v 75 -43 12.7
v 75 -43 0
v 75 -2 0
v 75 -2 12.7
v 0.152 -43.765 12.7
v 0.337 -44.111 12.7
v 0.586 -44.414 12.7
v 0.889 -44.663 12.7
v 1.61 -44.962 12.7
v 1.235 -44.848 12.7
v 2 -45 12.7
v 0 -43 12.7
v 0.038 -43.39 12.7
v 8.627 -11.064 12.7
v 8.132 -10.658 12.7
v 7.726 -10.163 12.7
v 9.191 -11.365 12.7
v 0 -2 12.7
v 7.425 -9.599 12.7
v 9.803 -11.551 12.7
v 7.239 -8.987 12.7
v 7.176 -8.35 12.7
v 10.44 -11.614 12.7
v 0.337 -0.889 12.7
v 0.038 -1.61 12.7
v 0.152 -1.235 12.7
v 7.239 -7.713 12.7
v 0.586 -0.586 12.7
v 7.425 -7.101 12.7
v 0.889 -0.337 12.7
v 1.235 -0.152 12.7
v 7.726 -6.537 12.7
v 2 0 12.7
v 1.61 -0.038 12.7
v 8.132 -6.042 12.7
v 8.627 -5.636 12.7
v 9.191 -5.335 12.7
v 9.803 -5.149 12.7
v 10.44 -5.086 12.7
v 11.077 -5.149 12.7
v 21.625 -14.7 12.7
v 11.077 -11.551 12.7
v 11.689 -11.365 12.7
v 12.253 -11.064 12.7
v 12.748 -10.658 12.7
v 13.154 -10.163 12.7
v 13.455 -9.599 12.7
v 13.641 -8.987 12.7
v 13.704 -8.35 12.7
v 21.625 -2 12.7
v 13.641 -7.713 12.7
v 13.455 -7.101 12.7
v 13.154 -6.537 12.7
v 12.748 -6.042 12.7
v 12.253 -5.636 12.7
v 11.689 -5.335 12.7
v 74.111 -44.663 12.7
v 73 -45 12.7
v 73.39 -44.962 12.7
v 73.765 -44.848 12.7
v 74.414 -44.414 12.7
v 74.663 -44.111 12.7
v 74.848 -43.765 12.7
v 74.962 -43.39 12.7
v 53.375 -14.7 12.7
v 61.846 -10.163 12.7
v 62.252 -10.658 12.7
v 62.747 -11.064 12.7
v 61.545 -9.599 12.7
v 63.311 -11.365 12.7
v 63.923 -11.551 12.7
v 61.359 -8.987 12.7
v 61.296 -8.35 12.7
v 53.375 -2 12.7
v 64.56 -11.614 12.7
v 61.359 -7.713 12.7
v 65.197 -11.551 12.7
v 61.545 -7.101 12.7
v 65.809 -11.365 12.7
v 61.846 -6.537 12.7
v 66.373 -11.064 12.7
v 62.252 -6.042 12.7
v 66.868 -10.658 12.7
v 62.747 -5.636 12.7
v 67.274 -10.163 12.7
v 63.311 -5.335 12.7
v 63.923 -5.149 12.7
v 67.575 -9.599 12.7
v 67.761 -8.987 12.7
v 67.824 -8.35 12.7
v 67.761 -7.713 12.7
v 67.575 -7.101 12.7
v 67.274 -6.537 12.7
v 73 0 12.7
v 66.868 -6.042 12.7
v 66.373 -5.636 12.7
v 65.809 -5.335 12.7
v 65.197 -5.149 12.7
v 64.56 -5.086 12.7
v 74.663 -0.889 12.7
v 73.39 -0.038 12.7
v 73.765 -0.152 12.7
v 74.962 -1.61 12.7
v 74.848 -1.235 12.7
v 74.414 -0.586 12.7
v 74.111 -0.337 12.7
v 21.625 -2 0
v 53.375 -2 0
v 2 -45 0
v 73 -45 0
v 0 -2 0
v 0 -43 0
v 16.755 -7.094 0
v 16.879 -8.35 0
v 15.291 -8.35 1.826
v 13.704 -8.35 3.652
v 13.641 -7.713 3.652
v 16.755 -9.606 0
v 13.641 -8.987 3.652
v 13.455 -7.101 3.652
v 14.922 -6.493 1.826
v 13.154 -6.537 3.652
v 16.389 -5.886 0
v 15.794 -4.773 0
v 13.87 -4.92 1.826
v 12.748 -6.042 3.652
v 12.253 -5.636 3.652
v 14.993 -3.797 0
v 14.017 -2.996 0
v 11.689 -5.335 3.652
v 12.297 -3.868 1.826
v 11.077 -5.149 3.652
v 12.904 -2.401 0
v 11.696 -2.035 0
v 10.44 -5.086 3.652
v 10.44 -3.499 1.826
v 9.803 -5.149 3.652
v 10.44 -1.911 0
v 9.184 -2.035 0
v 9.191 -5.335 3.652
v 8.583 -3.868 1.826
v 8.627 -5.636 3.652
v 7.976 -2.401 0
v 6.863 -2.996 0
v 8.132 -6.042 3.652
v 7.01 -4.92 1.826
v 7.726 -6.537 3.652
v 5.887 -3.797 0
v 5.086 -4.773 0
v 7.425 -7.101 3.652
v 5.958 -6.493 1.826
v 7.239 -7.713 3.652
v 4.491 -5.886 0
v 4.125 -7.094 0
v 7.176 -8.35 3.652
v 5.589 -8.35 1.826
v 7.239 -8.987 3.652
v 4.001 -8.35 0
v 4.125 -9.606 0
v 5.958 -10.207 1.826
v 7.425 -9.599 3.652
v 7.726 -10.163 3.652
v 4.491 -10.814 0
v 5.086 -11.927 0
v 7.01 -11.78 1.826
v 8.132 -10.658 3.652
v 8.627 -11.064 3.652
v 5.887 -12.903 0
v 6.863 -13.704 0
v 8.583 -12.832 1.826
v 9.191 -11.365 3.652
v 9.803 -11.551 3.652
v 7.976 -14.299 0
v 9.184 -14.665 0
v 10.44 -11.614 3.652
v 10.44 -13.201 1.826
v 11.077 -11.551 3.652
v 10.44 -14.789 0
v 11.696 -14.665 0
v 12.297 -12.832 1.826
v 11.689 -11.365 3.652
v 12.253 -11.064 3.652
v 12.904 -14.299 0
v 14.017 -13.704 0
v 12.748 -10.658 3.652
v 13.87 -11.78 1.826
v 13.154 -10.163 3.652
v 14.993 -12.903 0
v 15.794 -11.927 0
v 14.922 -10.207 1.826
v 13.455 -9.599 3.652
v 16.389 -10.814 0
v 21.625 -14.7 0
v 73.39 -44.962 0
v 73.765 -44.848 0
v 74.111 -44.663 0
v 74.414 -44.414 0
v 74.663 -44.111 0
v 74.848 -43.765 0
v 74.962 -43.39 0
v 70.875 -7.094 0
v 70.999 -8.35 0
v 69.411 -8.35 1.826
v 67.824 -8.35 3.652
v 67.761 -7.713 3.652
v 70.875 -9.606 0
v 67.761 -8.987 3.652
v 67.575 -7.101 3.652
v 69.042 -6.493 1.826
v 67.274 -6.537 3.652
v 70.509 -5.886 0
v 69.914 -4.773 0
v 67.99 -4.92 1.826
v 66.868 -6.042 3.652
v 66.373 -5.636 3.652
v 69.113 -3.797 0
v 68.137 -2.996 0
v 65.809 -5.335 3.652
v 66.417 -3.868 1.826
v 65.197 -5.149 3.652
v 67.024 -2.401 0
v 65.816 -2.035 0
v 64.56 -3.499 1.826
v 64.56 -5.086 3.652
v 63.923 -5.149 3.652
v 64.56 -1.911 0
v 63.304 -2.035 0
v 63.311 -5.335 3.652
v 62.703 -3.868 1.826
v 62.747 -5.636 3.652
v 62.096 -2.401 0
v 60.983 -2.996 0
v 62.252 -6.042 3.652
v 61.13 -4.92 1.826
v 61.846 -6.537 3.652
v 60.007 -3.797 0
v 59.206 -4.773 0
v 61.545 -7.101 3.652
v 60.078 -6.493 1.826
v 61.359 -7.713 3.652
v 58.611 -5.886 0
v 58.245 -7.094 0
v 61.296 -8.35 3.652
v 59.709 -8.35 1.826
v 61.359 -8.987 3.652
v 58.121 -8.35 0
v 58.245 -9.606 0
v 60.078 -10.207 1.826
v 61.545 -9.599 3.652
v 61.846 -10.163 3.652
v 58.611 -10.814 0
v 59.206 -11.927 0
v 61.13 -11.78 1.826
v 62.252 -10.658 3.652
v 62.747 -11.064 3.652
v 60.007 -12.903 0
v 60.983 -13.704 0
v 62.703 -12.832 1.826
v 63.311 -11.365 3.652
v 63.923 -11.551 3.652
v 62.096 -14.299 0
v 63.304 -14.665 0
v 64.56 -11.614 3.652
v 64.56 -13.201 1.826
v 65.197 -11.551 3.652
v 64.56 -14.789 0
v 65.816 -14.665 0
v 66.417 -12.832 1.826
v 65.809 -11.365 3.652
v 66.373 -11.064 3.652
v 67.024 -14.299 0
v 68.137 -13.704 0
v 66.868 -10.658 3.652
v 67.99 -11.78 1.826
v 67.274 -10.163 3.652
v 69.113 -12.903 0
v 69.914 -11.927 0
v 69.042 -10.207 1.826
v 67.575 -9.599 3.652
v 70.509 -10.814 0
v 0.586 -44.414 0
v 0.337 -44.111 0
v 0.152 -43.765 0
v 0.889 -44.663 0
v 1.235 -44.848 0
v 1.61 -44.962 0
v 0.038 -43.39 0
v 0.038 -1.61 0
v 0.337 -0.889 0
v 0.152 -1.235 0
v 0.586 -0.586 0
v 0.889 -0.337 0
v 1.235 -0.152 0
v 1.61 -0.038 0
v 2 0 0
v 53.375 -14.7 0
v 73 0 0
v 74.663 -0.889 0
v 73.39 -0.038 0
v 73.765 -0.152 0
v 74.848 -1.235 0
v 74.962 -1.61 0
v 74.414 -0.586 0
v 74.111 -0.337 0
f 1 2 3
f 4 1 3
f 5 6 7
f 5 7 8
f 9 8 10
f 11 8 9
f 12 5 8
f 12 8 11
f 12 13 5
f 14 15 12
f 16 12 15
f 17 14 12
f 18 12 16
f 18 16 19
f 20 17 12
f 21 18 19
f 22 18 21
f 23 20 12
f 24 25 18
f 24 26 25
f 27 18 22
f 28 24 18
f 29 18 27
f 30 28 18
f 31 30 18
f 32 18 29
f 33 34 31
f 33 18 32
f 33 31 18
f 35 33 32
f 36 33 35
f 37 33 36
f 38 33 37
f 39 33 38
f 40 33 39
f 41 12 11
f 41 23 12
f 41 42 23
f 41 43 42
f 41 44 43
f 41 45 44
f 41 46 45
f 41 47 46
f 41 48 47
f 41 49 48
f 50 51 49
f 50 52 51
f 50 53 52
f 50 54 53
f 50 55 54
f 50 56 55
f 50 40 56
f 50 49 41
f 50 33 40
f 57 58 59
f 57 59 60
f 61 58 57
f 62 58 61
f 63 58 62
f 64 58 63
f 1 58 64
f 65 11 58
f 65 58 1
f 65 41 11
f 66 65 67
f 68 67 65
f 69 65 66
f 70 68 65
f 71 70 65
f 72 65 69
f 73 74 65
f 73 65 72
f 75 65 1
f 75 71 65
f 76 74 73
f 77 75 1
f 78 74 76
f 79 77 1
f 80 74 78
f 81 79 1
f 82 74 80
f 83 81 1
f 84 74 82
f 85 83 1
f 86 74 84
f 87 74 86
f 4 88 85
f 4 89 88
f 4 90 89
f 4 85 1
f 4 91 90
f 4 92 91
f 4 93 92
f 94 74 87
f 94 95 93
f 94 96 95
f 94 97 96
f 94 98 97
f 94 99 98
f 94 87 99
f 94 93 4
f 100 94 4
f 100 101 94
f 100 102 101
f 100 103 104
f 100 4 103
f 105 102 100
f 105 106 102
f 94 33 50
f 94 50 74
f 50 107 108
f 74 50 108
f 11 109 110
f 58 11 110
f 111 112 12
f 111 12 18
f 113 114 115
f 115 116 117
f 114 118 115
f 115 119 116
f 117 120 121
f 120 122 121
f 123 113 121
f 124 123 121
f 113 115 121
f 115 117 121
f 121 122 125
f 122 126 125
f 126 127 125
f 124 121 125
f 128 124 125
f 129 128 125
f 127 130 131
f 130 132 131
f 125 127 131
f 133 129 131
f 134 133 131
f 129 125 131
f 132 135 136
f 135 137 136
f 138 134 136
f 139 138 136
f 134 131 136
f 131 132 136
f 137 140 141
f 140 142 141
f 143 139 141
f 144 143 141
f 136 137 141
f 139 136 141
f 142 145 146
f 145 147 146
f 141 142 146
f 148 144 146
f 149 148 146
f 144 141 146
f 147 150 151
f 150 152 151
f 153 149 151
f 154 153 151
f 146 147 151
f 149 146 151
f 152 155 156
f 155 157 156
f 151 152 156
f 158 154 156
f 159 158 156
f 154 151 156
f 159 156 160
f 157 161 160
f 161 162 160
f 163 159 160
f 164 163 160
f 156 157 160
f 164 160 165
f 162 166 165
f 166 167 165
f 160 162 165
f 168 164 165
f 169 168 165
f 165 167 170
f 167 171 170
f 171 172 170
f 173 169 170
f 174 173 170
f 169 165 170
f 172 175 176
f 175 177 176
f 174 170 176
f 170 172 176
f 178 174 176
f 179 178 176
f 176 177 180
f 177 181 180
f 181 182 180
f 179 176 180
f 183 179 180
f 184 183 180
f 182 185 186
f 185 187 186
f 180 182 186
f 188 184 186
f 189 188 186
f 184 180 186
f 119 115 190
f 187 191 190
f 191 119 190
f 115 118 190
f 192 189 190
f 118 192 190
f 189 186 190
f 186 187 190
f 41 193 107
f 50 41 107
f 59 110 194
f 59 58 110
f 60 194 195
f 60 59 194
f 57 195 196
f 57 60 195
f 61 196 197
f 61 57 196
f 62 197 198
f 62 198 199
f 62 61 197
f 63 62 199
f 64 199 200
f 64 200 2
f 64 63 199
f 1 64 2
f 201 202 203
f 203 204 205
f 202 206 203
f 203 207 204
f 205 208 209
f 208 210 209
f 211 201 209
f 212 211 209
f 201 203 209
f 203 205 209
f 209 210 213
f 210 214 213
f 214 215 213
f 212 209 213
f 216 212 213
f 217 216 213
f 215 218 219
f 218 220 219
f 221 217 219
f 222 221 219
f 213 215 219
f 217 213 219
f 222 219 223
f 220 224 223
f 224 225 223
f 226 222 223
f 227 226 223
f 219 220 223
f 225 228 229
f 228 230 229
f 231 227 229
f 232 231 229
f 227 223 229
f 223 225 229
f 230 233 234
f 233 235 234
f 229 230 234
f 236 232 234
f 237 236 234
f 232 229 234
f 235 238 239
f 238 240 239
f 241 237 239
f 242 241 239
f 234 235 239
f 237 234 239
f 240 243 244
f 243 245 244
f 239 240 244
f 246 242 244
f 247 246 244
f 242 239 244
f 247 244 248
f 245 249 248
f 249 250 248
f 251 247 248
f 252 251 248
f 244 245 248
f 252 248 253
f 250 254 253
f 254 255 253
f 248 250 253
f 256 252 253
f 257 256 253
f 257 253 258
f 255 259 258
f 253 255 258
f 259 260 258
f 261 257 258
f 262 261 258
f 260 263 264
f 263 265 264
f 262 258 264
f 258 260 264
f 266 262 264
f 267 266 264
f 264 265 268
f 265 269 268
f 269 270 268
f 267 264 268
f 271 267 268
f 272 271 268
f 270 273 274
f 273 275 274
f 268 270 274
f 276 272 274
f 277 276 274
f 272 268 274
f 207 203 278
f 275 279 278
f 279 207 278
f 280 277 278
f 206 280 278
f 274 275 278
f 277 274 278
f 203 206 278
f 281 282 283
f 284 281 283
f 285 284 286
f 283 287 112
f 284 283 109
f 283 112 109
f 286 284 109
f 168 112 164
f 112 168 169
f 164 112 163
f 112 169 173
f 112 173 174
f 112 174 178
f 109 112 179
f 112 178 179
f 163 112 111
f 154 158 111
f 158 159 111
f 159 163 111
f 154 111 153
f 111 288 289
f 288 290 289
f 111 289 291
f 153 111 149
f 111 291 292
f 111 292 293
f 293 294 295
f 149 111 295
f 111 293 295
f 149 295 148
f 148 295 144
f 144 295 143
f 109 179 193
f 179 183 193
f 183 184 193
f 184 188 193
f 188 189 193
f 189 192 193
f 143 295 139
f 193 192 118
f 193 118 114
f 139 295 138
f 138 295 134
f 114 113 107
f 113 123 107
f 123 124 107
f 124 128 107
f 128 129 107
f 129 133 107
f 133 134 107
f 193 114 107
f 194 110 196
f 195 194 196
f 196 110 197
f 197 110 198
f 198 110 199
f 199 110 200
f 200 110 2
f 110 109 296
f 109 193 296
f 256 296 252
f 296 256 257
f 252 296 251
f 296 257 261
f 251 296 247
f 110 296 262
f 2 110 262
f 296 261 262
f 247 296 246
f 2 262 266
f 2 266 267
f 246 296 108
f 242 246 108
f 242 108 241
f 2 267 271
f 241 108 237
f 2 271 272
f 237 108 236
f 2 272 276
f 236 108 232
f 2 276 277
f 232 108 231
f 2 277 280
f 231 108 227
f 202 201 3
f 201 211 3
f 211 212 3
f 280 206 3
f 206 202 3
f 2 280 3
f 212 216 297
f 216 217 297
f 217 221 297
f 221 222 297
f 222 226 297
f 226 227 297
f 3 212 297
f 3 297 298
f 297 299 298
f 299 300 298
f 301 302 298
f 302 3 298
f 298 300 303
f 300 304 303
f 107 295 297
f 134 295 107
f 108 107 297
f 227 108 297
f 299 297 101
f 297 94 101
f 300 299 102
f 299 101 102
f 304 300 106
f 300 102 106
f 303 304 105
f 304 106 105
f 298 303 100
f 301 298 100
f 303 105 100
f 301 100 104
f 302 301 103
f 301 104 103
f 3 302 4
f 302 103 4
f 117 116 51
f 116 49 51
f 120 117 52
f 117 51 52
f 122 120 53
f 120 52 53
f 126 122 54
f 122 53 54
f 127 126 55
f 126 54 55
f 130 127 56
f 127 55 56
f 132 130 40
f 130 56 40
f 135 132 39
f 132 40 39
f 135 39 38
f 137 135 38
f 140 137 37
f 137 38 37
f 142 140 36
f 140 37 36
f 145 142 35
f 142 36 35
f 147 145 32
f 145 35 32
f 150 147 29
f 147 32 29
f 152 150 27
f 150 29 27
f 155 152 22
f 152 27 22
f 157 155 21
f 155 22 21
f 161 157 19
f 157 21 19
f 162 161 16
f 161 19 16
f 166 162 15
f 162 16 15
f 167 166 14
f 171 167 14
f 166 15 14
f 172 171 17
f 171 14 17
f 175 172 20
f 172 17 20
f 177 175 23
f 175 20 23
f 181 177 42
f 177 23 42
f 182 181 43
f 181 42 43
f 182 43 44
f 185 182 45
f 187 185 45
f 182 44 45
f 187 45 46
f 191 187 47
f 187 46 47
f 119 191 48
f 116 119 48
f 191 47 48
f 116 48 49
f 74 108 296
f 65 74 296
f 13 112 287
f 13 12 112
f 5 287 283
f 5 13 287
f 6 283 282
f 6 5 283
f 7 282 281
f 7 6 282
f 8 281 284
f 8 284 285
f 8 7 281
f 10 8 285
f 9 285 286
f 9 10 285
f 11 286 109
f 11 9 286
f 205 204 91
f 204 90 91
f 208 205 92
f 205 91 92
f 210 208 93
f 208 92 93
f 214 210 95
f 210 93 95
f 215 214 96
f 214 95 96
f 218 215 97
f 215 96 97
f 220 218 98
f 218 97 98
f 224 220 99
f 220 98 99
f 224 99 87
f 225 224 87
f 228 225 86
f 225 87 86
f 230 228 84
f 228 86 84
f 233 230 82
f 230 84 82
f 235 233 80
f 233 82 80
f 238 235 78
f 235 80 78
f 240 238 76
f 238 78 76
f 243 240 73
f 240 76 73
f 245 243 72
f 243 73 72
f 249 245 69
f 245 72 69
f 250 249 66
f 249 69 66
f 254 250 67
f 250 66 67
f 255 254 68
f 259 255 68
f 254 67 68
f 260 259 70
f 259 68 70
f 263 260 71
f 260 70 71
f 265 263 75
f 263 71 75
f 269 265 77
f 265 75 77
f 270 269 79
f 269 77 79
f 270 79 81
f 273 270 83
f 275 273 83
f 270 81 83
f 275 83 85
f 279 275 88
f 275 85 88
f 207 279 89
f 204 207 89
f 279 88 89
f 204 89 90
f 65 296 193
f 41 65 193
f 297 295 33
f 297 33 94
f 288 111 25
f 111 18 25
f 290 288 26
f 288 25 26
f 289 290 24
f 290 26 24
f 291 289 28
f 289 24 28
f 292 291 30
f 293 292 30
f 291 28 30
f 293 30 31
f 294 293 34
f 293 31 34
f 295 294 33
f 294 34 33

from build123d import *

# Parameters (mm, degrees)
SKETCH1_W                                        = 75
SKETCH1_H                                        = 45
BOSS_EXTRUDE1_DEPTH                              = 12.7
CSK_FOR_1_4_FLAT_HEAD_MACHINE_SCREW2_D           = 6.5278
CSK_FOR_1_4_FLAT_HEAD_MACHINE_SCREW2_CSINK_D     = 12.8778
CSK_FOR_1_4_FLAT_HEAD_MACHINE_SCREW2_CSINK_ANGLE = 82
FILLET1_R                                        = 2
FILLET2_R                                        = 2


with BuildPart() as part:
    # Sketch1 → Boss-Extrude1 (new body)
    with BuildSketch(Plane.XY):
        with Locations((37.5, -22.5)):
            Rectangle(SKETCH1_W, SKETCH1_H)
        Polygon((37.5, -2), (53.375, -2), (53.375, -14.7), (21.625, -14.7), (21.625, -2), align=None, mode=Mode.SUBTRACT)
    extrude(amount=BOSS_EXTRUDE1_DEPTH)

    # CSK for 1/4 Flat Head Machine Screw2 (through all)
    with Locations(Plane(origin=(0, 0, 0), x_dir=(-1, 0, 0), z_dir=(0, 0, -1))):
        with Locations((-64.56, -8.35), (-10.44, -8.35)):
            CounterSinkHole(CSK_FOR_1_4_FLAT_HEAD_MACHINE_SCREW2_D / 2, CSK_FOR_1_4_FLAT_HEAD_MACHINE_SCREW2_CSINK_D / 2, counter_sink_angle=CSK_FOR_1_4_FLAT_HEAD_MACHINE_SCREW2_CSINK_ANGLE)

    # Fillet1
    fillet1_edges = [part.edges().sort_by_distance(p)[0] for p in [
        (0, 0, 6.35),
        (0, -45, 6.35),
    ]]
    fillet(fillet1_edges, radius=FILLET1_R)

    # Fillet2
    fillet2_edges = [part.edges().sort_by_distance(p)[0] for p in [
        (75, 0, 6.35),
        (75, -45, 6.35),
    ]]
    fillet(fillet2_edges, radius=FILLET2_R)


solid = part.part
